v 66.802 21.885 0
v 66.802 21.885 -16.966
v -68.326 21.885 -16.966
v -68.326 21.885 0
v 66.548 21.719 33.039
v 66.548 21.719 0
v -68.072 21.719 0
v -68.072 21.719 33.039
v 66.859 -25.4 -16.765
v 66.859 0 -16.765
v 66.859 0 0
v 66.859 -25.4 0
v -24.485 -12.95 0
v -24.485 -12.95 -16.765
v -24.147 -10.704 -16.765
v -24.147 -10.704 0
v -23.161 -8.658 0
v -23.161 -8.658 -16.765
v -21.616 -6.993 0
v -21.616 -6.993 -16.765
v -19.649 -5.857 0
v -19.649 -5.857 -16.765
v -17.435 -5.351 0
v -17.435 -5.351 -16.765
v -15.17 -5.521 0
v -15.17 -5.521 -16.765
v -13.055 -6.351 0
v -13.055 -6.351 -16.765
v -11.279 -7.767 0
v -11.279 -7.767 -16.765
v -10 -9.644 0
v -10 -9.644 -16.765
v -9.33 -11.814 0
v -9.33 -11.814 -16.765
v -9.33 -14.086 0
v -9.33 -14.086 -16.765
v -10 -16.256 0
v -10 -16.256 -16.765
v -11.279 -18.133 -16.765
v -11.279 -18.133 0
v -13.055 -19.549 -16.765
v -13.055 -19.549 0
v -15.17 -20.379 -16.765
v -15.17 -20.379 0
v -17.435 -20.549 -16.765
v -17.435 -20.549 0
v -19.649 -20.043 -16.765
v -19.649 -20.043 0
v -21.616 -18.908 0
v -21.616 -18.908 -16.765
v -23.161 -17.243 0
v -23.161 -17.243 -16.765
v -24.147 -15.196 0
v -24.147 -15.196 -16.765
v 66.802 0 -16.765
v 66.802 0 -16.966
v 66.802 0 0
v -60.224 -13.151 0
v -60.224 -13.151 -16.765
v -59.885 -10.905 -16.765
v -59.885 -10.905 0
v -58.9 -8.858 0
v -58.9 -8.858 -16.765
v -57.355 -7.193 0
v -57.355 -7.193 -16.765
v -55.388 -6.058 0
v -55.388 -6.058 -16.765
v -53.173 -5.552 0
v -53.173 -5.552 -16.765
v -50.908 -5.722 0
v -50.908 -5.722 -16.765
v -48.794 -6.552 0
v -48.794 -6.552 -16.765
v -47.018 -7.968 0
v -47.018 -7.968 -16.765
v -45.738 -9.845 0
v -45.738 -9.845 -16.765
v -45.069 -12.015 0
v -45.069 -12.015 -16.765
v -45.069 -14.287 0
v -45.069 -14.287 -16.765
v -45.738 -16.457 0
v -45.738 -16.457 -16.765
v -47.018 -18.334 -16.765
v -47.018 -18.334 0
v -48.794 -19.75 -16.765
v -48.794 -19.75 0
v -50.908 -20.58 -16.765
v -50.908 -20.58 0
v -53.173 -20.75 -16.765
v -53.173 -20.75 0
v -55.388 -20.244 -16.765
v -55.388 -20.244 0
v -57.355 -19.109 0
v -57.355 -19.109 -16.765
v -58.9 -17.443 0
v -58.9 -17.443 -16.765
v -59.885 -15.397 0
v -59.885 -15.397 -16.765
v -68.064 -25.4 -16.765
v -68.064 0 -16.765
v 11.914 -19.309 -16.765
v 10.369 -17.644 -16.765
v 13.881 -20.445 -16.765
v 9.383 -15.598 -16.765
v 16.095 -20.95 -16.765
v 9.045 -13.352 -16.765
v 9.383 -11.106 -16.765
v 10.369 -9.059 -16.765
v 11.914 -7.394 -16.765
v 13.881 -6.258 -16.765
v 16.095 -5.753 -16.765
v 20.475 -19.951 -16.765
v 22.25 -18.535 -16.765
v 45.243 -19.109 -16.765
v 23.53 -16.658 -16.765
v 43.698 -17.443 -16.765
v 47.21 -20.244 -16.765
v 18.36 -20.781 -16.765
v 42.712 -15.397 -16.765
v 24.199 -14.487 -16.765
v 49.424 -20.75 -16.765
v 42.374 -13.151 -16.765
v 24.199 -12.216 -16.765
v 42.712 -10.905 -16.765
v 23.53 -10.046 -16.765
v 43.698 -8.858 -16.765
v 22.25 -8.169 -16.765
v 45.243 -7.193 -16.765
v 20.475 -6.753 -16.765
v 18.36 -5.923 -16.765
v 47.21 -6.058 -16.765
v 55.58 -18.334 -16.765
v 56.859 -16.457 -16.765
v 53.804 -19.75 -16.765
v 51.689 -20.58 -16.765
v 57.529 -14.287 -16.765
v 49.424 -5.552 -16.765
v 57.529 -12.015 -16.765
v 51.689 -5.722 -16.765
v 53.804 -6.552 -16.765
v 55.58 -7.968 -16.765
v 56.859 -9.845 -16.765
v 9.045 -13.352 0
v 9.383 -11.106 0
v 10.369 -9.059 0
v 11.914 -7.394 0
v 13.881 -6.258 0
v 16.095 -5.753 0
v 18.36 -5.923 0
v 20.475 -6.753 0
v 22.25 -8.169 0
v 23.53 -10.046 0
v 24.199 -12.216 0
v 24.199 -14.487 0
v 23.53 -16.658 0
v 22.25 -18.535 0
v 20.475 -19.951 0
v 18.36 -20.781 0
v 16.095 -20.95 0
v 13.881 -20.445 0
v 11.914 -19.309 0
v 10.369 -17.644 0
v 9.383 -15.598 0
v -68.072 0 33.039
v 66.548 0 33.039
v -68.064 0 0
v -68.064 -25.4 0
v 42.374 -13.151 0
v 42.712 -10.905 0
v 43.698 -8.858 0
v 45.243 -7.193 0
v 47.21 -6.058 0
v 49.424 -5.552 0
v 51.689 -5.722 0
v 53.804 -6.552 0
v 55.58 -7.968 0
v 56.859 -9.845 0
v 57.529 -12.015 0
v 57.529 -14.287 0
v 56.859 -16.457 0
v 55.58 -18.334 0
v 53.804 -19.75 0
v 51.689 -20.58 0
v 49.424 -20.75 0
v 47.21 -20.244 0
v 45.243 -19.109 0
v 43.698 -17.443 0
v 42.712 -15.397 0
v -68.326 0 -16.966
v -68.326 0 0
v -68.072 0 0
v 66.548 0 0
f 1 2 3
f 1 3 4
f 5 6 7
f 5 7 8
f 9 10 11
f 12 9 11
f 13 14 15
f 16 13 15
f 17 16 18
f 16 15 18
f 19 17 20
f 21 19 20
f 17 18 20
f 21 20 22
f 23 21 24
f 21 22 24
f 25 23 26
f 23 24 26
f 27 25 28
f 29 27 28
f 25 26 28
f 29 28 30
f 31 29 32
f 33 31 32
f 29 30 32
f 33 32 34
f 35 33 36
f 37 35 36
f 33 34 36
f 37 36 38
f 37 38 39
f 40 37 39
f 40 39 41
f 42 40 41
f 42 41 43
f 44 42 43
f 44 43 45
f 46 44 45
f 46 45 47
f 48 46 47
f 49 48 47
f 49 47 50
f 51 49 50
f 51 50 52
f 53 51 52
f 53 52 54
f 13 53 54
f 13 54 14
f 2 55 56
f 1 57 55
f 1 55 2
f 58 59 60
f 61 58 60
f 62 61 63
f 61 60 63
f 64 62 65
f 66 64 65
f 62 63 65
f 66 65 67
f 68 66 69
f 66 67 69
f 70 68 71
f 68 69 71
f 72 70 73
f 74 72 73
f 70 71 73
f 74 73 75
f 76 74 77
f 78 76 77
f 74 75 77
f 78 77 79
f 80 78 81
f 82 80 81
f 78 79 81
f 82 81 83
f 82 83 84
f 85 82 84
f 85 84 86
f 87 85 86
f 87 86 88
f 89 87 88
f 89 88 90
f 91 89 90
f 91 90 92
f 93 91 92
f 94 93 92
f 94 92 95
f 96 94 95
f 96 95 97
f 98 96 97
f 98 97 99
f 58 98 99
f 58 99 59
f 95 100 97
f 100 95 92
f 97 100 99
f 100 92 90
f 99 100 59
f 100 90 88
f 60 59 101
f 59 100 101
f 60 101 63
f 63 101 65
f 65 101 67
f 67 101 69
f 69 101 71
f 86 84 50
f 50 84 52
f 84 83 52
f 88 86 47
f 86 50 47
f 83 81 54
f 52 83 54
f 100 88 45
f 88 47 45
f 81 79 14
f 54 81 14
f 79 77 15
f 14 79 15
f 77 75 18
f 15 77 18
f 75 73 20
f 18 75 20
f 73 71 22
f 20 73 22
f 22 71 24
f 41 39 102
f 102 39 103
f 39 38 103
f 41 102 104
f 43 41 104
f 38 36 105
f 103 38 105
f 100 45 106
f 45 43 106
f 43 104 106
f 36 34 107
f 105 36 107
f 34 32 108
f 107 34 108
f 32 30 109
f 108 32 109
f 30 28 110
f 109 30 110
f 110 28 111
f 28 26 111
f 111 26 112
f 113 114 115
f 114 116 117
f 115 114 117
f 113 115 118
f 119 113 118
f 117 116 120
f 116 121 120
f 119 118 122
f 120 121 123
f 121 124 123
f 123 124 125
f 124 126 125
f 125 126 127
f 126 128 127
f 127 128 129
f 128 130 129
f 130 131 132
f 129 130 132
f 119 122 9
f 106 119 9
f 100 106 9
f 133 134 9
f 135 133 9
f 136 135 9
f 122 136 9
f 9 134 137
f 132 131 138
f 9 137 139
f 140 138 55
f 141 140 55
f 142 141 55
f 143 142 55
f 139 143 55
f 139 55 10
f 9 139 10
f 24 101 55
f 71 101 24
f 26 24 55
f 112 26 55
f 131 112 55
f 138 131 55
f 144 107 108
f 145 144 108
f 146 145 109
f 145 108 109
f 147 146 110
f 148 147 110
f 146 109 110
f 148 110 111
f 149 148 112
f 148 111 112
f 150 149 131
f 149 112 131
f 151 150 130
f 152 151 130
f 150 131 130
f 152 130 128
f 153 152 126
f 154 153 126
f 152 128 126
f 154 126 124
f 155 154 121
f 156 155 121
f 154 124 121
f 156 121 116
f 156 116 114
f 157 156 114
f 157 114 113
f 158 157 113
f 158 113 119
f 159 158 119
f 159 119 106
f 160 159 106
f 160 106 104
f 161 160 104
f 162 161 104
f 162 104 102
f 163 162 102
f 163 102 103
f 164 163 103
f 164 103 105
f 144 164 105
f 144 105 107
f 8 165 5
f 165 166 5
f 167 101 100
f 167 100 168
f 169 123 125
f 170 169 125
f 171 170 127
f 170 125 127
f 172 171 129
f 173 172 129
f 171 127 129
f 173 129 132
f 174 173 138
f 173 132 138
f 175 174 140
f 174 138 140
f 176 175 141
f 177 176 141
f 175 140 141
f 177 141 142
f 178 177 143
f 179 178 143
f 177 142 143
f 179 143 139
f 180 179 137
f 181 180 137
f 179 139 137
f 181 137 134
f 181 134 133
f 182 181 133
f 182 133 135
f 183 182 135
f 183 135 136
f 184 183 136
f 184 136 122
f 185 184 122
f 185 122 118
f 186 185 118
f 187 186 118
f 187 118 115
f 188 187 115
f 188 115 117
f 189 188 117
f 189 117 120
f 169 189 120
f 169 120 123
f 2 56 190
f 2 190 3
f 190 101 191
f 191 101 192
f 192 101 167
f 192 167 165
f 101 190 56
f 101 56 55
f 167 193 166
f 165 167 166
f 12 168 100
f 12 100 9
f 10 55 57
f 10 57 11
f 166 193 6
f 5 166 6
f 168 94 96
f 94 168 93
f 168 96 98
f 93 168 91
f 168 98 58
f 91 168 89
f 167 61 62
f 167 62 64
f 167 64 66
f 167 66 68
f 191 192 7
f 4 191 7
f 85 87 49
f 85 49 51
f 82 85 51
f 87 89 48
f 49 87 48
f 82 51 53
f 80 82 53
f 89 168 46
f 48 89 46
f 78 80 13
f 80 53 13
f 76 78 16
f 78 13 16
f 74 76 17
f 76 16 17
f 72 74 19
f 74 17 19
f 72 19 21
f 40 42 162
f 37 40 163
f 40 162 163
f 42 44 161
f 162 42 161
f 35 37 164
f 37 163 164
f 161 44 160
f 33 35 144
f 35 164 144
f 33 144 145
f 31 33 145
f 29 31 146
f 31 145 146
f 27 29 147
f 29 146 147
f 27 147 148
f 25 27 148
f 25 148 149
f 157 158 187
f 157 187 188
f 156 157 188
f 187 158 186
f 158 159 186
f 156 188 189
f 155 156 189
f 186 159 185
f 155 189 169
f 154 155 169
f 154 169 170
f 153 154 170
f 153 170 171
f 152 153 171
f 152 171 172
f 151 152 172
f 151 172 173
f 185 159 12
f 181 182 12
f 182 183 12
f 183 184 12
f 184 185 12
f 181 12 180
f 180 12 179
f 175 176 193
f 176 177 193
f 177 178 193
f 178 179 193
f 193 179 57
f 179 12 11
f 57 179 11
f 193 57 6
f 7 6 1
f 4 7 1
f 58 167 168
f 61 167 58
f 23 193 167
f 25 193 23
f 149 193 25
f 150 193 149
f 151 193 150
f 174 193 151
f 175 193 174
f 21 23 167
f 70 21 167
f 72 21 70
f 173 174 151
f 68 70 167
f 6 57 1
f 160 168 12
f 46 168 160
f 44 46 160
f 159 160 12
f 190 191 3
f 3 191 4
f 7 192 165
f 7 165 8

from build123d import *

# Parameters (mm, degrees)
F0_W     = 134.9227651954
F0_H     = 16.7649574578
F1_DEPTH = 25.4
F2_W     = 21.8847934157
F2_H     = 16.9657338411
F3_DEPTH = 25.4
F4_DEPTH = 25.4
F5_DEPTH = 16.002
F6_DEPTH = 68.326
F7_W     = 21.7192191631
F7_H     = 33.0388583243
F8_DEPTH = 66.548
F9_DEPTH = 68.072
F11_D    = 15.24
F12_D    = 15.24
F13_D    = 15.24


with BuildPart() as f1:
    # F0 (on Front) → F1 (new body)
    with BuildSketch(Plane.XZ):
        with Locations((-0.6023310125, -8.3824787289)):
            Rectangle(F0_W, F0_H)
    extrude(amount=F1_DEPTH)

    # F2 (on Right) → F3 (join)
    with BuildSketch(Plane.YZ):
        with Locations((10.9423967078, -8.4828669205)):
            Rectangle(F2_W, F2_H)
    extrude(amount=F3_DEPTH)

    # F4 (add): a face of the model
    f4_faces = [f1.faces().sort_by_distance(p)[0] for p in [
        (25.4, 10.9423967078, -8.4828669205),
    ]]
    extrude(f4_faces, amount=F4_DEPTH)

    # F5 (add): a face of the model
    f5_faces = [f1.faces().sort_by_distance(p)[0] for p in [
        (50.8, 10.9423967078, -8.4828669205),
    ]]
    extrude(f5_faces, amount=F5_DEPTH)

    # F6 (add): a face of the model
    f6_faces = [f1.faces().sort_by_distance(p)[0] for p in [
        (0, 10.9423967078, -8.4828669205),
    ]]
    extrude(f6_faces, amount=F6_DEPTH)

    # F7 (on Right) → F8 (join)
    with BuildSketch(Plane.YZ):
        with Locations((10.8596095815, 16.5194291621)):
            Rectangle(F7_W, F7_H)
    extrude(amount=F8_DEPTH)

    # F9 (add): a face of the model
    f9_faces = [f1.faces().sort_by_distance(p)[0] for p in [
        (0, 10.8596095815, 16.5194291621),
    ]]
    extrude(f9_faces, amount=F9_DEPTH)

    # F11 (through all)
    with Locations(Plane.XY):
        with Locations((-52.6038147509, -13.1509546191)):
            Hole(F11_D / 2)

    # F12 (through all)
    with Locations(Plane.XY):
        with Locations((-16.8653447181, -12.9501754418)):
            Hole(F12_D / 2)

    # F13 (through all)
    with Locations(Plane.XY):
        with Locations((16.6645683348, -13.3517310023), (49.9937050045, -13.1509546191)):
            Hole(F13_D / 2)


solid = f1.part
